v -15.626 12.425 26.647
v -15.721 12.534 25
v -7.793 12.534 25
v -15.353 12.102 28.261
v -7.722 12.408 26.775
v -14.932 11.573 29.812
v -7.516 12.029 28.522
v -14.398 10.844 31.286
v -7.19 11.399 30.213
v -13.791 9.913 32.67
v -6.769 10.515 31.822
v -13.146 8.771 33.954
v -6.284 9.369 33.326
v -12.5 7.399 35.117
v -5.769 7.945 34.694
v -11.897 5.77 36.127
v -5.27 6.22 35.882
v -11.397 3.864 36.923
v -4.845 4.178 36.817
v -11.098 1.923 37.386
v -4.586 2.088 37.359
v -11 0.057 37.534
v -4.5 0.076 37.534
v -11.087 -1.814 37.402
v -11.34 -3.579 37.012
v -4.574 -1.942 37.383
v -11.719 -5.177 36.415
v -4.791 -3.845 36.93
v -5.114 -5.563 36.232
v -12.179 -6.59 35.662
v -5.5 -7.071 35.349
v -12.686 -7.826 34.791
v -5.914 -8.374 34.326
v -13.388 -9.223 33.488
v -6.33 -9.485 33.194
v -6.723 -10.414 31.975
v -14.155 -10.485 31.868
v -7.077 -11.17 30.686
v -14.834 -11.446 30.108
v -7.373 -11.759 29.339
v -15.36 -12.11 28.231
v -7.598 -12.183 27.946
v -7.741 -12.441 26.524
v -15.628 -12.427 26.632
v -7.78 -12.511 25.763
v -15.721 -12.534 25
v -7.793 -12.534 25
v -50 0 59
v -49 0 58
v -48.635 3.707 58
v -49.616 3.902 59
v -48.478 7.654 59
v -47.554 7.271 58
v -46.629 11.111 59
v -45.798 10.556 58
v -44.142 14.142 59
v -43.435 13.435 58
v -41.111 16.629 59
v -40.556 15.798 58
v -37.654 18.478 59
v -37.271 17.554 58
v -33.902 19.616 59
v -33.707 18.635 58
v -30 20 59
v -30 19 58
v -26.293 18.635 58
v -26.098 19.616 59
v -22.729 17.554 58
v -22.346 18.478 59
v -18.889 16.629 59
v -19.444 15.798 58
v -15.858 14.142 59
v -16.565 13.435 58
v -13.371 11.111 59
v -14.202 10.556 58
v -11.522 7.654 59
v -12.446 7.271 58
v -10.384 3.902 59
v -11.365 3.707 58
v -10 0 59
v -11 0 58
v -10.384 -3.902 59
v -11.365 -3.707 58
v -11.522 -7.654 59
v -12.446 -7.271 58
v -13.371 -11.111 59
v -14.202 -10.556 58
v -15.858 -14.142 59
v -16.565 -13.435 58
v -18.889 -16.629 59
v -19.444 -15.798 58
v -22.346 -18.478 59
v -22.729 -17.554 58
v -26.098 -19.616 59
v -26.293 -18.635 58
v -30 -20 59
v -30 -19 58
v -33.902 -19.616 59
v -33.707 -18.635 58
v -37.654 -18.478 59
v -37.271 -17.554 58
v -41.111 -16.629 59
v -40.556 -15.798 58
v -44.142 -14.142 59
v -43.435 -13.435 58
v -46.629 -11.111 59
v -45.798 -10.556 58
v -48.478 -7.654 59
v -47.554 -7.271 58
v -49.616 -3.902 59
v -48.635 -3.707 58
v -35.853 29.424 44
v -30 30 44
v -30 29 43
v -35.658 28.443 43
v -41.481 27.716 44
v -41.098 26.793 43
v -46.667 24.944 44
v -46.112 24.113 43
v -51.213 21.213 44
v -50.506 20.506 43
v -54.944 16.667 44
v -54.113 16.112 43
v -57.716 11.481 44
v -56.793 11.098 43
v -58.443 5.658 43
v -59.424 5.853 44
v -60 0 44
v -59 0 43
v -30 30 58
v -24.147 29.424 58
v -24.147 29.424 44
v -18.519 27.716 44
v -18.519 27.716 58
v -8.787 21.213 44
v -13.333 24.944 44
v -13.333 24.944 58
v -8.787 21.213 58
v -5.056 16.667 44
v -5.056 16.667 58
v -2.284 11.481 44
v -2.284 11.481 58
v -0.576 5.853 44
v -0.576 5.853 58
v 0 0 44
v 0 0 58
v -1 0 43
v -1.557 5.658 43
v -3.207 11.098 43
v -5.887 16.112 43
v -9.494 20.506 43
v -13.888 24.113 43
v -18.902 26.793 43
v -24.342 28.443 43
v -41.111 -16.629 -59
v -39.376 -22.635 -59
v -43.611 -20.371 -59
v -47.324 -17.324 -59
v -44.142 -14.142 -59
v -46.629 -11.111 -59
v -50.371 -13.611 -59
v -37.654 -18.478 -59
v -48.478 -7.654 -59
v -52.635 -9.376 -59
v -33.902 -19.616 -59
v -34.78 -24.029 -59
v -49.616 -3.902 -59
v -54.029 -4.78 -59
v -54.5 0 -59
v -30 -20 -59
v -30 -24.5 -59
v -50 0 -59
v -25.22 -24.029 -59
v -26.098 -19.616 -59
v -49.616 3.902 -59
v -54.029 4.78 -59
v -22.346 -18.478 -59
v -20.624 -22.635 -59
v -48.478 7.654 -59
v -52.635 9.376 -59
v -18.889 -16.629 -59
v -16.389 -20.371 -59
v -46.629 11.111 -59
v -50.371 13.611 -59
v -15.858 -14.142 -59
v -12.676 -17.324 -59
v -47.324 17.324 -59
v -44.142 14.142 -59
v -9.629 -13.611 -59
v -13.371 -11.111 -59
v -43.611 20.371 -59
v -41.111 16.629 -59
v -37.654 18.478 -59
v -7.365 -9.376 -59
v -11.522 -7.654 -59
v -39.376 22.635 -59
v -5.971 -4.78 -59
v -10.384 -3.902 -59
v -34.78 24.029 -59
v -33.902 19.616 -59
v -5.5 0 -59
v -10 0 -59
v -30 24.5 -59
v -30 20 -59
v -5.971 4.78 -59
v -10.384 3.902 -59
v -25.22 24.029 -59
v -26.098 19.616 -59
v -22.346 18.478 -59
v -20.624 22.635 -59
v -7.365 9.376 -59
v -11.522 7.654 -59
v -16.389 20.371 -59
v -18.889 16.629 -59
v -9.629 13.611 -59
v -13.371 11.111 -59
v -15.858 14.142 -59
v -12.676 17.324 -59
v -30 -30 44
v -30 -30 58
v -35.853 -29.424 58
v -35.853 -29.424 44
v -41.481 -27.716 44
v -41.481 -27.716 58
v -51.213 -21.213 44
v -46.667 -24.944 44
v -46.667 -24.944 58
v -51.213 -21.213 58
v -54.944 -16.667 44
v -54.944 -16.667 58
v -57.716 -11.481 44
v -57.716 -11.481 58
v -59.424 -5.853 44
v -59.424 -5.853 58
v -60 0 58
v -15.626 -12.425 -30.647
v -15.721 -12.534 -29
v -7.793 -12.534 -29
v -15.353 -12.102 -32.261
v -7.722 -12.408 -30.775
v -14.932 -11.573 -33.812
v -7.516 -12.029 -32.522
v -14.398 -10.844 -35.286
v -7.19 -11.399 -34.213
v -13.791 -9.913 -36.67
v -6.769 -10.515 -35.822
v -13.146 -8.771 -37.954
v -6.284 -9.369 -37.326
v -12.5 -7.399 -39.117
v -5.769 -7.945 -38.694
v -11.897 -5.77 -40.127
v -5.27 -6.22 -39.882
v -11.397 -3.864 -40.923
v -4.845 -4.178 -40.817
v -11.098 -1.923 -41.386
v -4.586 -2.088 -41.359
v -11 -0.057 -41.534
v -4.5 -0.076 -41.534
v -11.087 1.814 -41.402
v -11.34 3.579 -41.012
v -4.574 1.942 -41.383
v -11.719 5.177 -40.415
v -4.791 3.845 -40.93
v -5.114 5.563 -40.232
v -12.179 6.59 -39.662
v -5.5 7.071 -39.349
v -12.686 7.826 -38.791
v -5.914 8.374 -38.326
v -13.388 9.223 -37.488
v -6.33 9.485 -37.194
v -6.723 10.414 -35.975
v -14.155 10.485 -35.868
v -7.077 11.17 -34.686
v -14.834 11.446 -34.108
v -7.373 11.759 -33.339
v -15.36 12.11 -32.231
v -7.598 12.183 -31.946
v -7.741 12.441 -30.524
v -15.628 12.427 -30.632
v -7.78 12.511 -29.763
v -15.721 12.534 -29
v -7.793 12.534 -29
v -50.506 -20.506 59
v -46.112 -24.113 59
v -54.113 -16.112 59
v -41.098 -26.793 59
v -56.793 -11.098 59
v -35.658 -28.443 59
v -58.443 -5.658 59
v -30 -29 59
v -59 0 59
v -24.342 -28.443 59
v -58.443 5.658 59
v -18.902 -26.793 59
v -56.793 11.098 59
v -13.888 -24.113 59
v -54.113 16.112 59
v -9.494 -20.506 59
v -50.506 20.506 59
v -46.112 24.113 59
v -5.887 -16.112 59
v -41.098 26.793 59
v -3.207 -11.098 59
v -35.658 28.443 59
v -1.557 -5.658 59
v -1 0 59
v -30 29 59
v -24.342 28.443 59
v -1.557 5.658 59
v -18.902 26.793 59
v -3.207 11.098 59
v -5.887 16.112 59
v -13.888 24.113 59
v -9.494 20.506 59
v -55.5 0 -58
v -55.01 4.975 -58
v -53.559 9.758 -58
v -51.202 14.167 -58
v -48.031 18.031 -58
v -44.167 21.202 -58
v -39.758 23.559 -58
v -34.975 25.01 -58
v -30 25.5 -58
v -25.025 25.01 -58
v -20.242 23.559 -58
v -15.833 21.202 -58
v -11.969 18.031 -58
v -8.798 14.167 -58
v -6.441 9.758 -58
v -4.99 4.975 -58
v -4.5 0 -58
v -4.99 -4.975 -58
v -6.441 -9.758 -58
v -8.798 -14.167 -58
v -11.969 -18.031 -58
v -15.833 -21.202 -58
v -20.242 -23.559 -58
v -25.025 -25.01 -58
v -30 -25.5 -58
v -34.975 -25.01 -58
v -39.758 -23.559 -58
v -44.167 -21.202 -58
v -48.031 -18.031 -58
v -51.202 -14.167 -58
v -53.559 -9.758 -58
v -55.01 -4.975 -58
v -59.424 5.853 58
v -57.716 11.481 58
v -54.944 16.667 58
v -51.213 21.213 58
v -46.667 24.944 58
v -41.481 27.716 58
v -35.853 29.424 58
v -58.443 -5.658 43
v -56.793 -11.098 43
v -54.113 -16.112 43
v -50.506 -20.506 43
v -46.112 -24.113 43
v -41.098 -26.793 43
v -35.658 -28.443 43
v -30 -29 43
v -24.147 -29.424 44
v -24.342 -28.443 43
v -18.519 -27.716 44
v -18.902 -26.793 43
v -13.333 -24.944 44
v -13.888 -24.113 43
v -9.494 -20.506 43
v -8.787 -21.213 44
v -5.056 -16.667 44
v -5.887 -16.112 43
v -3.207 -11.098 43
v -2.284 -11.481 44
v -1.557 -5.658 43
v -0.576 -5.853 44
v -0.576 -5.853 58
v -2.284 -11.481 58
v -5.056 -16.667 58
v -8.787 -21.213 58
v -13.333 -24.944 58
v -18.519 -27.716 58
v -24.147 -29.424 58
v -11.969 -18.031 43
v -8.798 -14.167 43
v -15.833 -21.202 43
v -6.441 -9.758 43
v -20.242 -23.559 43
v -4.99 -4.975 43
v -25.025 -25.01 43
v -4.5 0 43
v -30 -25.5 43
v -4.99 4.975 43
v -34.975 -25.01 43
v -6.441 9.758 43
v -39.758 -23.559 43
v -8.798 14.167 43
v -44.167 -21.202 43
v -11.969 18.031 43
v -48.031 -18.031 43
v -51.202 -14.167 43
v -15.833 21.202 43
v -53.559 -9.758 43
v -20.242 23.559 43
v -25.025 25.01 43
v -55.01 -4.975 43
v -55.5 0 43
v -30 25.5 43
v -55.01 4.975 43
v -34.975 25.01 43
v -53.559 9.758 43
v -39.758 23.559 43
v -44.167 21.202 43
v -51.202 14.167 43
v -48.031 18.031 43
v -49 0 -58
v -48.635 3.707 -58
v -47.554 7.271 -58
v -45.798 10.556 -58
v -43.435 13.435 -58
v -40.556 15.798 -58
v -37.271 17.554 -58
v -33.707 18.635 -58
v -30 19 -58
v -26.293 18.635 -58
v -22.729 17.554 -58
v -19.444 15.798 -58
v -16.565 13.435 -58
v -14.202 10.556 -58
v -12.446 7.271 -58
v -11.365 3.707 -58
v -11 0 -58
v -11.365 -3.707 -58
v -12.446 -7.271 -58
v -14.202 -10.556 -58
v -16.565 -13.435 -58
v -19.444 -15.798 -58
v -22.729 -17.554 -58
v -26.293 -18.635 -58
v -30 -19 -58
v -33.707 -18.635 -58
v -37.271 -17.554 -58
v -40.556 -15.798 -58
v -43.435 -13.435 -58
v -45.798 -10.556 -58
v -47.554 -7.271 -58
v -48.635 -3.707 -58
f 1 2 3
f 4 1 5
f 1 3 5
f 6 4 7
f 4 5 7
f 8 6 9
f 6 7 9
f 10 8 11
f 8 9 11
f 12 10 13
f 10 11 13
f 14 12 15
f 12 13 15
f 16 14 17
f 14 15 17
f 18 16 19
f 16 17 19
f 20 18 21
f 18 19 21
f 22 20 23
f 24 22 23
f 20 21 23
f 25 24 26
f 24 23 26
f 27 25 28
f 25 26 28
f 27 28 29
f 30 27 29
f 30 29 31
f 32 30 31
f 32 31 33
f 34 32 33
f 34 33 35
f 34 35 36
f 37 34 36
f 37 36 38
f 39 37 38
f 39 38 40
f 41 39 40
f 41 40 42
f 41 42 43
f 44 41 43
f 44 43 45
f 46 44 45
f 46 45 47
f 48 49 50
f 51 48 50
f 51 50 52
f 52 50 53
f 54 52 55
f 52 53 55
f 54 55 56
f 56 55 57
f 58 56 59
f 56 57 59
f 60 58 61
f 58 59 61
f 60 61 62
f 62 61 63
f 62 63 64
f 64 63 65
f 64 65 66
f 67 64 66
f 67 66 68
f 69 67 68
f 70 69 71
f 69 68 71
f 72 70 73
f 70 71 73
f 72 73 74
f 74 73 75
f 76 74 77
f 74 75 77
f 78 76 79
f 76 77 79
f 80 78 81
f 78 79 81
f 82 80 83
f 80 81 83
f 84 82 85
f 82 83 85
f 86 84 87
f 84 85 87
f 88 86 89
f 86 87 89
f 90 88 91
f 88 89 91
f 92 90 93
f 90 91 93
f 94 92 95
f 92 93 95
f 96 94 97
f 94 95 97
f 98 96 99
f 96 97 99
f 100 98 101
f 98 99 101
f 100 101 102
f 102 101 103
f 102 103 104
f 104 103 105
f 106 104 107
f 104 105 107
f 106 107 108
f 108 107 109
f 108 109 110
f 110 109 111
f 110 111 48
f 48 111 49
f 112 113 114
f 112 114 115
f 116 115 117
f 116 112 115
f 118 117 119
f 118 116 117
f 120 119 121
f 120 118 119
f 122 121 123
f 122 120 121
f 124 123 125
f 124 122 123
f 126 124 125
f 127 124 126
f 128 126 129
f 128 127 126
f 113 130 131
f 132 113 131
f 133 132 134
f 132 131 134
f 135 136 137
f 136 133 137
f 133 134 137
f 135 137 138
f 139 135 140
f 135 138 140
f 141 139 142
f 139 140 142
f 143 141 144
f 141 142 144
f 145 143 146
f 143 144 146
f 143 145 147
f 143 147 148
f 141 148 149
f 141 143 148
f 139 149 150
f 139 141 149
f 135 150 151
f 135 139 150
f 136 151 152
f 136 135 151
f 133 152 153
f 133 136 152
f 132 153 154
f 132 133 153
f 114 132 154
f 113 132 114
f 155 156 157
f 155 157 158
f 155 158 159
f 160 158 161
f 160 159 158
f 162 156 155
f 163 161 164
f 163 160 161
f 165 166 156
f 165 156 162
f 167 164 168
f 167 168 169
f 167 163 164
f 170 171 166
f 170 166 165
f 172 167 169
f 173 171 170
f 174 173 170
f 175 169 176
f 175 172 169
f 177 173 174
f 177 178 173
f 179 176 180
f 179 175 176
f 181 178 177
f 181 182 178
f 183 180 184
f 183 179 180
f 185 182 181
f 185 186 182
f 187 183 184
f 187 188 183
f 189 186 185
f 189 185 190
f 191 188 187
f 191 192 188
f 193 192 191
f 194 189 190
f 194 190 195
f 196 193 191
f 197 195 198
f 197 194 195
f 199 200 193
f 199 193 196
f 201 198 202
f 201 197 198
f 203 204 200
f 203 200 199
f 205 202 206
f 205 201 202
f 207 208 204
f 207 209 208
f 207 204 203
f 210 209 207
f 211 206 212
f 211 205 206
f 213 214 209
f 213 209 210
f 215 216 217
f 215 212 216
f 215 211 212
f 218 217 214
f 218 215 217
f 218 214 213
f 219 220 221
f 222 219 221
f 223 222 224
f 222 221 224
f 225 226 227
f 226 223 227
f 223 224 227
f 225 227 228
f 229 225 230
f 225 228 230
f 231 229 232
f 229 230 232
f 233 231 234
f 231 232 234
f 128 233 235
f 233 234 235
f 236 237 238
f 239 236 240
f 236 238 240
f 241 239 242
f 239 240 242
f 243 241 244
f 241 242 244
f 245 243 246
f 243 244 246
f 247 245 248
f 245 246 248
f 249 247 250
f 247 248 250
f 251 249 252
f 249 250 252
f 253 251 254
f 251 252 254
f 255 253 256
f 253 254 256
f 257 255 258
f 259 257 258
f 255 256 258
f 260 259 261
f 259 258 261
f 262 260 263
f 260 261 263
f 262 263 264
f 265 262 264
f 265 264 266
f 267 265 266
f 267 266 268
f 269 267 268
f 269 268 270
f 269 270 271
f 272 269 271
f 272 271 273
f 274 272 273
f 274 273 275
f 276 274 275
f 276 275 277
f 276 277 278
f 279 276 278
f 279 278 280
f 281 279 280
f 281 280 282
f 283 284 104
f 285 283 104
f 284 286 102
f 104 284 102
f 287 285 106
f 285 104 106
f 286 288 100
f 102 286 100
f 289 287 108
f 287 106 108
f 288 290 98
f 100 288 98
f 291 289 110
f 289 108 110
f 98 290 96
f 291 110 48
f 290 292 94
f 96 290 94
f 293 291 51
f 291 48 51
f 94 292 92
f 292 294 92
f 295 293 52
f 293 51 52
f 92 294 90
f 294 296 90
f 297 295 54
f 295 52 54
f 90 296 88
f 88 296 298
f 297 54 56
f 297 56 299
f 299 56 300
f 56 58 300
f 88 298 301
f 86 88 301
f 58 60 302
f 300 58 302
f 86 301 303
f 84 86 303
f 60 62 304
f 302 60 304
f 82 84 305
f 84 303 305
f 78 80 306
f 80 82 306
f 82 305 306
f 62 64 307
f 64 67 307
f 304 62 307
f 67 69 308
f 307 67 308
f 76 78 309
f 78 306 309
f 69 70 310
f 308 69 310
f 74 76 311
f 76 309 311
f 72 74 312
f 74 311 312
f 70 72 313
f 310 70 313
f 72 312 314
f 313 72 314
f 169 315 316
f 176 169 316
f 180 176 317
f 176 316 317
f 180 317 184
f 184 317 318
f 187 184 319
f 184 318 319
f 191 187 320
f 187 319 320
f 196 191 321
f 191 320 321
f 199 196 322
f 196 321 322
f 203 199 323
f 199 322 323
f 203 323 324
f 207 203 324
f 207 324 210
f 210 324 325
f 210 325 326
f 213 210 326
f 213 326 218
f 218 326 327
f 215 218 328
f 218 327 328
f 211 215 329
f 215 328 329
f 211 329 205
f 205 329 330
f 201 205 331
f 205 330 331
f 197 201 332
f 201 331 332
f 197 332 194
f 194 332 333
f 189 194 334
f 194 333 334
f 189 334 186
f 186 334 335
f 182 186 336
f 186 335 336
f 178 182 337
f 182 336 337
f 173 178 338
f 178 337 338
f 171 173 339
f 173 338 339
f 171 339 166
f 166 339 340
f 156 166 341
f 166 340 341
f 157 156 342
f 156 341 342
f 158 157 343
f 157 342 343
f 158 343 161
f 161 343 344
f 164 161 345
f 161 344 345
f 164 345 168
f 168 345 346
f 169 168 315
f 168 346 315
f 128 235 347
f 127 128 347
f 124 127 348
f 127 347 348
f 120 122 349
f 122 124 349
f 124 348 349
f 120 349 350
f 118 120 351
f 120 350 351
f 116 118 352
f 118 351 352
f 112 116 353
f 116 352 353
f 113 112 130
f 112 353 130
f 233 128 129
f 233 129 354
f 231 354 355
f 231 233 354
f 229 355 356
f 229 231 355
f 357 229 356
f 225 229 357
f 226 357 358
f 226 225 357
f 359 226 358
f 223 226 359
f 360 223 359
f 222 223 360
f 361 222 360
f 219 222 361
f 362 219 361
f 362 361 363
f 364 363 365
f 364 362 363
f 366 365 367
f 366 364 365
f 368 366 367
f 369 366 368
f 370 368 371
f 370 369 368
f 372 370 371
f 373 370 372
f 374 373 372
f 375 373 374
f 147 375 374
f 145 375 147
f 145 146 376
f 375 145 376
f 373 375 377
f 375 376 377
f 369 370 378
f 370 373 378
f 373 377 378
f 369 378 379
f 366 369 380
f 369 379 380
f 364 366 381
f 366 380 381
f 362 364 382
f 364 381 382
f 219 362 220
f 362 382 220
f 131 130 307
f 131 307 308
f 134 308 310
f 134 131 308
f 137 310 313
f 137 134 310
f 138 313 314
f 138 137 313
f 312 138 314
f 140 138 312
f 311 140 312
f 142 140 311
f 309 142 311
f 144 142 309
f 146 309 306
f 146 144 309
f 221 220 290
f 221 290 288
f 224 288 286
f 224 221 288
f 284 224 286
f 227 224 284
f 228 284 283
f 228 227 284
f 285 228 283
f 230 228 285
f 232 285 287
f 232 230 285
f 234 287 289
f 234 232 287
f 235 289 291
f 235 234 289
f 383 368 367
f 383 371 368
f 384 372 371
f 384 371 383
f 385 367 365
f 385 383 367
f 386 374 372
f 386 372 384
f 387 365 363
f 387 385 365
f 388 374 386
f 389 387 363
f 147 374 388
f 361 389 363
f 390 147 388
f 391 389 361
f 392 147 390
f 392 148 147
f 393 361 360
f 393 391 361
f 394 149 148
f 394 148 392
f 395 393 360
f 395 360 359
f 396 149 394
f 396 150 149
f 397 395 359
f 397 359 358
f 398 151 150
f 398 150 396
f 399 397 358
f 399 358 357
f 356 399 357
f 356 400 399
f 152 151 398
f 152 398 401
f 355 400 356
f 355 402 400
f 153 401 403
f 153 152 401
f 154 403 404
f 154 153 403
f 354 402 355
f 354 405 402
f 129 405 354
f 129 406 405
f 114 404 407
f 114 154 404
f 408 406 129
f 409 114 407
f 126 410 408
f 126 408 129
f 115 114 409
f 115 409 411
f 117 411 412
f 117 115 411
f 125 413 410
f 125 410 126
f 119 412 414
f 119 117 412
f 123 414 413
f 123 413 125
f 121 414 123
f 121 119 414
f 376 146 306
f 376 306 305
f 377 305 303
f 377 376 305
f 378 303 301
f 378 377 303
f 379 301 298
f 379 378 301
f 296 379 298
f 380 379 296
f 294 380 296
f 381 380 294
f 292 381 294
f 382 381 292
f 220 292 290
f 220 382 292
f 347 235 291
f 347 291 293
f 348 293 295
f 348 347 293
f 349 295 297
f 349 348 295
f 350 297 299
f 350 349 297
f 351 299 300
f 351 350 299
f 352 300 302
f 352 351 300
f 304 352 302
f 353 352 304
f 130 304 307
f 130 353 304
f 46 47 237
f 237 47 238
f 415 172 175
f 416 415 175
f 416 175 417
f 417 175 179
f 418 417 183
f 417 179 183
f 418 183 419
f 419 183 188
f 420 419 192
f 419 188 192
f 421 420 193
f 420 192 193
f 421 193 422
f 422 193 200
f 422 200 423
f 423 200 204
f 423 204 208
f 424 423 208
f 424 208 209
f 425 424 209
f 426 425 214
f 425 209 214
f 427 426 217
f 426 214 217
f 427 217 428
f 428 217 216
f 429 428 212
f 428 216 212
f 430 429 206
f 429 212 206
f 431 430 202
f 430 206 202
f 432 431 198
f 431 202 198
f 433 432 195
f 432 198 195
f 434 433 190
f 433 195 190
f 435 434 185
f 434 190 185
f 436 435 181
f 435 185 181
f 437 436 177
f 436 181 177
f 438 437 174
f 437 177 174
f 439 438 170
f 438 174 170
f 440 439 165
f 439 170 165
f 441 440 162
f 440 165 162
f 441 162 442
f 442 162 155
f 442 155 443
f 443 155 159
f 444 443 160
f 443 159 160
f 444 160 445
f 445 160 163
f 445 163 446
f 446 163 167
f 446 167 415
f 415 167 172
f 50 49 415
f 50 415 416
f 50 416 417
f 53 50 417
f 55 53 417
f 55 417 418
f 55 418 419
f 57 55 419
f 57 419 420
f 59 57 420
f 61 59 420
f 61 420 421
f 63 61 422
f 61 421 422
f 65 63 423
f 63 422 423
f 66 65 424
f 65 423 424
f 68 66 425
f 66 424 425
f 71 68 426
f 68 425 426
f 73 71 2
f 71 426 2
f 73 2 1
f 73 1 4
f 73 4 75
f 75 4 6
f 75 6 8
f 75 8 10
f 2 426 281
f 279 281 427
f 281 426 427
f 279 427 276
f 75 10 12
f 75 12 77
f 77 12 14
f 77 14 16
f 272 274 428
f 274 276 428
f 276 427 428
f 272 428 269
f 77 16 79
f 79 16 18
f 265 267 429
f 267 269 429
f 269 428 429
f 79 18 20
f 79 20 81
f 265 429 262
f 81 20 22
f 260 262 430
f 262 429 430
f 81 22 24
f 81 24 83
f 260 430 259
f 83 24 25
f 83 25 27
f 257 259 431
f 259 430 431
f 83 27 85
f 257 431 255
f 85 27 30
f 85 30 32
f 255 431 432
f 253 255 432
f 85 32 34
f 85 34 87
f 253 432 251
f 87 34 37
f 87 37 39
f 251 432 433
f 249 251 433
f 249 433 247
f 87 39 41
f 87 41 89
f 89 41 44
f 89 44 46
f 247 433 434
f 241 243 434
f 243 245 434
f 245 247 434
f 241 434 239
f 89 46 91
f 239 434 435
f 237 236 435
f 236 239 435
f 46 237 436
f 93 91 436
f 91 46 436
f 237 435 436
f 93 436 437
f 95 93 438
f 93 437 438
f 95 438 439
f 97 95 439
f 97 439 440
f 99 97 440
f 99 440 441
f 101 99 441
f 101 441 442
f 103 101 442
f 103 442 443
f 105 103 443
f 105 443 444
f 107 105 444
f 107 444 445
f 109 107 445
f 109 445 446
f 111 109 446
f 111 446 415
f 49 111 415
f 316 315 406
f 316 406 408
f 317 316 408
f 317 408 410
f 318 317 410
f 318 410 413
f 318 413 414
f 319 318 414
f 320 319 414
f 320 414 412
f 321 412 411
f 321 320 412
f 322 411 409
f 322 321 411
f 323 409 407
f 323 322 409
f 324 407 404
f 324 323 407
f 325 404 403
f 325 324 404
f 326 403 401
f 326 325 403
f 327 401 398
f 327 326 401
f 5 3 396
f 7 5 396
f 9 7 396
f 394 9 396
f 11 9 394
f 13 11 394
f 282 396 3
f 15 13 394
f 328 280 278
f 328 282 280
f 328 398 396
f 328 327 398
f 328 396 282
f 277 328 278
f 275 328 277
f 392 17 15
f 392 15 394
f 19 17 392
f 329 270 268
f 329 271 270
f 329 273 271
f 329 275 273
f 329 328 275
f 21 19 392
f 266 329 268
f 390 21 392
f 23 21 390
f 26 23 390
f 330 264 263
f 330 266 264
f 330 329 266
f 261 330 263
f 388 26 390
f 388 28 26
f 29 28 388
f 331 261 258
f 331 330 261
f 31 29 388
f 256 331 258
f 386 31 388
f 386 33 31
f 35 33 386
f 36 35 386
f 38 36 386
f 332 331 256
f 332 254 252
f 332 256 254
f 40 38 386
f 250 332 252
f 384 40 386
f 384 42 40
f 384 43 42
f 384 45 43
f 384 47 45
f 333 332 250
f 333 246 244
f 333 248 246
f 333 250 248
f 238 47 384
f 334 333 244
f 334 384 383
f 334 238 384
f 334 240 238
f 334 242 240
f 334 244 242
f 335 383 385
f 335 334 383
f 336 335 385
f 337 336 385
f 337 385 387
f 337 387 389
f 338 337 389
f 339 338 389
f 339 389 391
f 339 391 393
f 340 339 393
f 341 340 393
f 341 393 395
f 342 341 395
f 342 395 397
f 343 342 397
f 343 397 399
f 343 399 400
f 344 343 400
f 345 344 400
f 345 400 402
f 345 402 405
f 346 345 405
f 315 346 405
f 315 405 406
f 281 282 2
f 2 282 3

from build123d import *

# Parameters (mm, degrees)
SCHIZZO1_W                   = 118
SCHIZZO1_H                   = 60
ESTRUSIONE_ESTRUSIONE1_DEPTH = 60
TAGLIO_ESTRUSIONE1_DEPTH     = 30
SCHIZZO3_W                   = 60
SCHIZZO3_H                   = 60
SCHIZZO3_R                   = 25.5
TAGLIO_ESTRUSIONE4_DEPTH     = 102
TAGLIO_ESTRUSIONE5_DEPTH     = 18
SCHIZZO5_R                   = 19
TAGLIO_ESTRUSIONE6_DEPTH     = 136.735036008
SMUSSO1_SIZE                 = 1
SMUSSO2_SIZE                 = 1
SMUSSO3_SIZE                 = 1
SMUSSO4_SIZE                 = 1
SMUSSO5_SIZE                 = 1


with BuildPart() as part:
    # Schizzo1 → Estrusione-Estrusione1 (new body)
    with BuildSketch(Plane(origin=(0, 0, 0), x_dir=(0, 0, -1), z_dir=(1, 0, 0))):
        Rectangle(SCHIZZO1_W, SCHIZZO1_H)
    extrude(amount=-ESTRUSIONE_ESTRUSIONE1_DEPTH)

    # Schizzo2 → Taglio-Estrusione1 (cut)
    with BuildSketch(Plane(origin=(0, 0, 0), x_dir=(0, 0, -1), z_dir=(1, 0, 0))):
        with BuildLine():
            Line((29, 12.534031414), (-25, 12.534031414))
            ThreePointArc((-25, 12.534031414), (-37.534031414, 0), (-25, -12.534031414))
            Line((-25, -12.534031414), (29, -12.534031414))
            ThreePointArc((29, -12.534031414), (41.534031414, 0), (29, 12.534031414))
        make_face()
    extrude(amount=-TAGLIO_ESTRUSIONE1_DEPTH, mode=Mode.SUBTRACT)

    # Schizzo3 → Taglio-Estrusione4 (cut)
    with BuildSketch(Plane(origin=(0, 0, -59), x_dir=(-1, 0, 0), z_dir=(0, 0, -1))):
        with Locations((30, 0)):
            Rectangle(SCHIZZO3_W, SCHIZZO3_H)
        with Locations((30, 0)):
            Circle(SCHIZZO3_R, mode=Mode.SUBTRACT)
    extrude(amount=-TAGLIO_ESTRUSIONE4_DEPTH, mode=Mode.SUBTRACT)

    # Schizzo4 → Taglio-Estrusione5 (cut)
    with BuildSketch(Plane.XY.offset(59)):
        with BuildLine():
            Line((-30, 30), (-60, 30))
            Line((-60, 30), (-60, 0))
            ThreePointArc((-60, 0), (-51.213203436, 21.213203436), (-30, 30))
        make_face()
        with BuildLine():
            Line((0, 30), (-30, 30))
            ThreePointArc((-30, 30), (-8.786796564, 21.213203436), (0, 0))
            Line((0, 0), (0, 30))
        make_face()
        with BuildLine():
            Line((0, -30), (0, 0))
            ThreePointArc((0, 0), (-8.786796564, -21.213203436), (-30, -30))
            Line((-30, -30), (0, -30))
        make_face()
        with BuildLine():
            ThreePointArc((-30, -30), (-51.213203436, -21.213203436), (-60, 0))
            Line((-60, 0), (-60, -30))
            Line((-60, -30), (-30, -30))
        make_face()
    extrude(amount=-TAGLIO_ESTRUSIONE5_DEPTH, mode=Mode.SUBTRACT)

    # Schizzo5 → Taglio-Estrusione6 (cut, through all)
    with BuildSketch(Plane(origin=(0, 0, -59), x_dir=(-1, 0, 0), z_dir=(0, 0, -1))):
        with Locations((30, 0)):
            Circle(SCHIZZO5_R)
    extrude(amount=-TAGLIO_ESTRUSIONE6_DEPTH, mode=Mode.SUBTRACT)

    # Smusso1
    smusso1_edges = [part.edges().sort_by_distance(p)[0] for p in [
        (-11, 0, -59),
    ]]
    chamfer(smusso1_edges, length=SMUSSO1_SIZE)

    # Smusso2
    smusso2_edges = [part.edges().sort_by_distance(p)[0] for p in [
        (-4.5, 0, -59),
    ]]
    chamfer(smusso2_edges, length=SMUSSO2_SIZE)

    # Smusso3
    smusso3_edges = [part.edges().sort_by_distance(p)[0] for p in [
        (-60, 0, 43),
    ]]
    chamfer(smusso3_edges, length=SMUSSO3_SIZE)

    # Smusso4
    smusso4_edges = [part.edges().sort_by_distance(p)[0] for p in [
        (-11, 0, 59),
    ]]
    chamfer(smusso4_edges, length=SMUSSO4_SIZE)

    # Smusso5
    smusso5_edges = [part.edges().sort_by_distance(p)[0] for p in [
        (-60, 0, 59),
    ]]
    chamfer(smusso5_edges, length=SMUSSO5_SIZE)


solid = part.part
